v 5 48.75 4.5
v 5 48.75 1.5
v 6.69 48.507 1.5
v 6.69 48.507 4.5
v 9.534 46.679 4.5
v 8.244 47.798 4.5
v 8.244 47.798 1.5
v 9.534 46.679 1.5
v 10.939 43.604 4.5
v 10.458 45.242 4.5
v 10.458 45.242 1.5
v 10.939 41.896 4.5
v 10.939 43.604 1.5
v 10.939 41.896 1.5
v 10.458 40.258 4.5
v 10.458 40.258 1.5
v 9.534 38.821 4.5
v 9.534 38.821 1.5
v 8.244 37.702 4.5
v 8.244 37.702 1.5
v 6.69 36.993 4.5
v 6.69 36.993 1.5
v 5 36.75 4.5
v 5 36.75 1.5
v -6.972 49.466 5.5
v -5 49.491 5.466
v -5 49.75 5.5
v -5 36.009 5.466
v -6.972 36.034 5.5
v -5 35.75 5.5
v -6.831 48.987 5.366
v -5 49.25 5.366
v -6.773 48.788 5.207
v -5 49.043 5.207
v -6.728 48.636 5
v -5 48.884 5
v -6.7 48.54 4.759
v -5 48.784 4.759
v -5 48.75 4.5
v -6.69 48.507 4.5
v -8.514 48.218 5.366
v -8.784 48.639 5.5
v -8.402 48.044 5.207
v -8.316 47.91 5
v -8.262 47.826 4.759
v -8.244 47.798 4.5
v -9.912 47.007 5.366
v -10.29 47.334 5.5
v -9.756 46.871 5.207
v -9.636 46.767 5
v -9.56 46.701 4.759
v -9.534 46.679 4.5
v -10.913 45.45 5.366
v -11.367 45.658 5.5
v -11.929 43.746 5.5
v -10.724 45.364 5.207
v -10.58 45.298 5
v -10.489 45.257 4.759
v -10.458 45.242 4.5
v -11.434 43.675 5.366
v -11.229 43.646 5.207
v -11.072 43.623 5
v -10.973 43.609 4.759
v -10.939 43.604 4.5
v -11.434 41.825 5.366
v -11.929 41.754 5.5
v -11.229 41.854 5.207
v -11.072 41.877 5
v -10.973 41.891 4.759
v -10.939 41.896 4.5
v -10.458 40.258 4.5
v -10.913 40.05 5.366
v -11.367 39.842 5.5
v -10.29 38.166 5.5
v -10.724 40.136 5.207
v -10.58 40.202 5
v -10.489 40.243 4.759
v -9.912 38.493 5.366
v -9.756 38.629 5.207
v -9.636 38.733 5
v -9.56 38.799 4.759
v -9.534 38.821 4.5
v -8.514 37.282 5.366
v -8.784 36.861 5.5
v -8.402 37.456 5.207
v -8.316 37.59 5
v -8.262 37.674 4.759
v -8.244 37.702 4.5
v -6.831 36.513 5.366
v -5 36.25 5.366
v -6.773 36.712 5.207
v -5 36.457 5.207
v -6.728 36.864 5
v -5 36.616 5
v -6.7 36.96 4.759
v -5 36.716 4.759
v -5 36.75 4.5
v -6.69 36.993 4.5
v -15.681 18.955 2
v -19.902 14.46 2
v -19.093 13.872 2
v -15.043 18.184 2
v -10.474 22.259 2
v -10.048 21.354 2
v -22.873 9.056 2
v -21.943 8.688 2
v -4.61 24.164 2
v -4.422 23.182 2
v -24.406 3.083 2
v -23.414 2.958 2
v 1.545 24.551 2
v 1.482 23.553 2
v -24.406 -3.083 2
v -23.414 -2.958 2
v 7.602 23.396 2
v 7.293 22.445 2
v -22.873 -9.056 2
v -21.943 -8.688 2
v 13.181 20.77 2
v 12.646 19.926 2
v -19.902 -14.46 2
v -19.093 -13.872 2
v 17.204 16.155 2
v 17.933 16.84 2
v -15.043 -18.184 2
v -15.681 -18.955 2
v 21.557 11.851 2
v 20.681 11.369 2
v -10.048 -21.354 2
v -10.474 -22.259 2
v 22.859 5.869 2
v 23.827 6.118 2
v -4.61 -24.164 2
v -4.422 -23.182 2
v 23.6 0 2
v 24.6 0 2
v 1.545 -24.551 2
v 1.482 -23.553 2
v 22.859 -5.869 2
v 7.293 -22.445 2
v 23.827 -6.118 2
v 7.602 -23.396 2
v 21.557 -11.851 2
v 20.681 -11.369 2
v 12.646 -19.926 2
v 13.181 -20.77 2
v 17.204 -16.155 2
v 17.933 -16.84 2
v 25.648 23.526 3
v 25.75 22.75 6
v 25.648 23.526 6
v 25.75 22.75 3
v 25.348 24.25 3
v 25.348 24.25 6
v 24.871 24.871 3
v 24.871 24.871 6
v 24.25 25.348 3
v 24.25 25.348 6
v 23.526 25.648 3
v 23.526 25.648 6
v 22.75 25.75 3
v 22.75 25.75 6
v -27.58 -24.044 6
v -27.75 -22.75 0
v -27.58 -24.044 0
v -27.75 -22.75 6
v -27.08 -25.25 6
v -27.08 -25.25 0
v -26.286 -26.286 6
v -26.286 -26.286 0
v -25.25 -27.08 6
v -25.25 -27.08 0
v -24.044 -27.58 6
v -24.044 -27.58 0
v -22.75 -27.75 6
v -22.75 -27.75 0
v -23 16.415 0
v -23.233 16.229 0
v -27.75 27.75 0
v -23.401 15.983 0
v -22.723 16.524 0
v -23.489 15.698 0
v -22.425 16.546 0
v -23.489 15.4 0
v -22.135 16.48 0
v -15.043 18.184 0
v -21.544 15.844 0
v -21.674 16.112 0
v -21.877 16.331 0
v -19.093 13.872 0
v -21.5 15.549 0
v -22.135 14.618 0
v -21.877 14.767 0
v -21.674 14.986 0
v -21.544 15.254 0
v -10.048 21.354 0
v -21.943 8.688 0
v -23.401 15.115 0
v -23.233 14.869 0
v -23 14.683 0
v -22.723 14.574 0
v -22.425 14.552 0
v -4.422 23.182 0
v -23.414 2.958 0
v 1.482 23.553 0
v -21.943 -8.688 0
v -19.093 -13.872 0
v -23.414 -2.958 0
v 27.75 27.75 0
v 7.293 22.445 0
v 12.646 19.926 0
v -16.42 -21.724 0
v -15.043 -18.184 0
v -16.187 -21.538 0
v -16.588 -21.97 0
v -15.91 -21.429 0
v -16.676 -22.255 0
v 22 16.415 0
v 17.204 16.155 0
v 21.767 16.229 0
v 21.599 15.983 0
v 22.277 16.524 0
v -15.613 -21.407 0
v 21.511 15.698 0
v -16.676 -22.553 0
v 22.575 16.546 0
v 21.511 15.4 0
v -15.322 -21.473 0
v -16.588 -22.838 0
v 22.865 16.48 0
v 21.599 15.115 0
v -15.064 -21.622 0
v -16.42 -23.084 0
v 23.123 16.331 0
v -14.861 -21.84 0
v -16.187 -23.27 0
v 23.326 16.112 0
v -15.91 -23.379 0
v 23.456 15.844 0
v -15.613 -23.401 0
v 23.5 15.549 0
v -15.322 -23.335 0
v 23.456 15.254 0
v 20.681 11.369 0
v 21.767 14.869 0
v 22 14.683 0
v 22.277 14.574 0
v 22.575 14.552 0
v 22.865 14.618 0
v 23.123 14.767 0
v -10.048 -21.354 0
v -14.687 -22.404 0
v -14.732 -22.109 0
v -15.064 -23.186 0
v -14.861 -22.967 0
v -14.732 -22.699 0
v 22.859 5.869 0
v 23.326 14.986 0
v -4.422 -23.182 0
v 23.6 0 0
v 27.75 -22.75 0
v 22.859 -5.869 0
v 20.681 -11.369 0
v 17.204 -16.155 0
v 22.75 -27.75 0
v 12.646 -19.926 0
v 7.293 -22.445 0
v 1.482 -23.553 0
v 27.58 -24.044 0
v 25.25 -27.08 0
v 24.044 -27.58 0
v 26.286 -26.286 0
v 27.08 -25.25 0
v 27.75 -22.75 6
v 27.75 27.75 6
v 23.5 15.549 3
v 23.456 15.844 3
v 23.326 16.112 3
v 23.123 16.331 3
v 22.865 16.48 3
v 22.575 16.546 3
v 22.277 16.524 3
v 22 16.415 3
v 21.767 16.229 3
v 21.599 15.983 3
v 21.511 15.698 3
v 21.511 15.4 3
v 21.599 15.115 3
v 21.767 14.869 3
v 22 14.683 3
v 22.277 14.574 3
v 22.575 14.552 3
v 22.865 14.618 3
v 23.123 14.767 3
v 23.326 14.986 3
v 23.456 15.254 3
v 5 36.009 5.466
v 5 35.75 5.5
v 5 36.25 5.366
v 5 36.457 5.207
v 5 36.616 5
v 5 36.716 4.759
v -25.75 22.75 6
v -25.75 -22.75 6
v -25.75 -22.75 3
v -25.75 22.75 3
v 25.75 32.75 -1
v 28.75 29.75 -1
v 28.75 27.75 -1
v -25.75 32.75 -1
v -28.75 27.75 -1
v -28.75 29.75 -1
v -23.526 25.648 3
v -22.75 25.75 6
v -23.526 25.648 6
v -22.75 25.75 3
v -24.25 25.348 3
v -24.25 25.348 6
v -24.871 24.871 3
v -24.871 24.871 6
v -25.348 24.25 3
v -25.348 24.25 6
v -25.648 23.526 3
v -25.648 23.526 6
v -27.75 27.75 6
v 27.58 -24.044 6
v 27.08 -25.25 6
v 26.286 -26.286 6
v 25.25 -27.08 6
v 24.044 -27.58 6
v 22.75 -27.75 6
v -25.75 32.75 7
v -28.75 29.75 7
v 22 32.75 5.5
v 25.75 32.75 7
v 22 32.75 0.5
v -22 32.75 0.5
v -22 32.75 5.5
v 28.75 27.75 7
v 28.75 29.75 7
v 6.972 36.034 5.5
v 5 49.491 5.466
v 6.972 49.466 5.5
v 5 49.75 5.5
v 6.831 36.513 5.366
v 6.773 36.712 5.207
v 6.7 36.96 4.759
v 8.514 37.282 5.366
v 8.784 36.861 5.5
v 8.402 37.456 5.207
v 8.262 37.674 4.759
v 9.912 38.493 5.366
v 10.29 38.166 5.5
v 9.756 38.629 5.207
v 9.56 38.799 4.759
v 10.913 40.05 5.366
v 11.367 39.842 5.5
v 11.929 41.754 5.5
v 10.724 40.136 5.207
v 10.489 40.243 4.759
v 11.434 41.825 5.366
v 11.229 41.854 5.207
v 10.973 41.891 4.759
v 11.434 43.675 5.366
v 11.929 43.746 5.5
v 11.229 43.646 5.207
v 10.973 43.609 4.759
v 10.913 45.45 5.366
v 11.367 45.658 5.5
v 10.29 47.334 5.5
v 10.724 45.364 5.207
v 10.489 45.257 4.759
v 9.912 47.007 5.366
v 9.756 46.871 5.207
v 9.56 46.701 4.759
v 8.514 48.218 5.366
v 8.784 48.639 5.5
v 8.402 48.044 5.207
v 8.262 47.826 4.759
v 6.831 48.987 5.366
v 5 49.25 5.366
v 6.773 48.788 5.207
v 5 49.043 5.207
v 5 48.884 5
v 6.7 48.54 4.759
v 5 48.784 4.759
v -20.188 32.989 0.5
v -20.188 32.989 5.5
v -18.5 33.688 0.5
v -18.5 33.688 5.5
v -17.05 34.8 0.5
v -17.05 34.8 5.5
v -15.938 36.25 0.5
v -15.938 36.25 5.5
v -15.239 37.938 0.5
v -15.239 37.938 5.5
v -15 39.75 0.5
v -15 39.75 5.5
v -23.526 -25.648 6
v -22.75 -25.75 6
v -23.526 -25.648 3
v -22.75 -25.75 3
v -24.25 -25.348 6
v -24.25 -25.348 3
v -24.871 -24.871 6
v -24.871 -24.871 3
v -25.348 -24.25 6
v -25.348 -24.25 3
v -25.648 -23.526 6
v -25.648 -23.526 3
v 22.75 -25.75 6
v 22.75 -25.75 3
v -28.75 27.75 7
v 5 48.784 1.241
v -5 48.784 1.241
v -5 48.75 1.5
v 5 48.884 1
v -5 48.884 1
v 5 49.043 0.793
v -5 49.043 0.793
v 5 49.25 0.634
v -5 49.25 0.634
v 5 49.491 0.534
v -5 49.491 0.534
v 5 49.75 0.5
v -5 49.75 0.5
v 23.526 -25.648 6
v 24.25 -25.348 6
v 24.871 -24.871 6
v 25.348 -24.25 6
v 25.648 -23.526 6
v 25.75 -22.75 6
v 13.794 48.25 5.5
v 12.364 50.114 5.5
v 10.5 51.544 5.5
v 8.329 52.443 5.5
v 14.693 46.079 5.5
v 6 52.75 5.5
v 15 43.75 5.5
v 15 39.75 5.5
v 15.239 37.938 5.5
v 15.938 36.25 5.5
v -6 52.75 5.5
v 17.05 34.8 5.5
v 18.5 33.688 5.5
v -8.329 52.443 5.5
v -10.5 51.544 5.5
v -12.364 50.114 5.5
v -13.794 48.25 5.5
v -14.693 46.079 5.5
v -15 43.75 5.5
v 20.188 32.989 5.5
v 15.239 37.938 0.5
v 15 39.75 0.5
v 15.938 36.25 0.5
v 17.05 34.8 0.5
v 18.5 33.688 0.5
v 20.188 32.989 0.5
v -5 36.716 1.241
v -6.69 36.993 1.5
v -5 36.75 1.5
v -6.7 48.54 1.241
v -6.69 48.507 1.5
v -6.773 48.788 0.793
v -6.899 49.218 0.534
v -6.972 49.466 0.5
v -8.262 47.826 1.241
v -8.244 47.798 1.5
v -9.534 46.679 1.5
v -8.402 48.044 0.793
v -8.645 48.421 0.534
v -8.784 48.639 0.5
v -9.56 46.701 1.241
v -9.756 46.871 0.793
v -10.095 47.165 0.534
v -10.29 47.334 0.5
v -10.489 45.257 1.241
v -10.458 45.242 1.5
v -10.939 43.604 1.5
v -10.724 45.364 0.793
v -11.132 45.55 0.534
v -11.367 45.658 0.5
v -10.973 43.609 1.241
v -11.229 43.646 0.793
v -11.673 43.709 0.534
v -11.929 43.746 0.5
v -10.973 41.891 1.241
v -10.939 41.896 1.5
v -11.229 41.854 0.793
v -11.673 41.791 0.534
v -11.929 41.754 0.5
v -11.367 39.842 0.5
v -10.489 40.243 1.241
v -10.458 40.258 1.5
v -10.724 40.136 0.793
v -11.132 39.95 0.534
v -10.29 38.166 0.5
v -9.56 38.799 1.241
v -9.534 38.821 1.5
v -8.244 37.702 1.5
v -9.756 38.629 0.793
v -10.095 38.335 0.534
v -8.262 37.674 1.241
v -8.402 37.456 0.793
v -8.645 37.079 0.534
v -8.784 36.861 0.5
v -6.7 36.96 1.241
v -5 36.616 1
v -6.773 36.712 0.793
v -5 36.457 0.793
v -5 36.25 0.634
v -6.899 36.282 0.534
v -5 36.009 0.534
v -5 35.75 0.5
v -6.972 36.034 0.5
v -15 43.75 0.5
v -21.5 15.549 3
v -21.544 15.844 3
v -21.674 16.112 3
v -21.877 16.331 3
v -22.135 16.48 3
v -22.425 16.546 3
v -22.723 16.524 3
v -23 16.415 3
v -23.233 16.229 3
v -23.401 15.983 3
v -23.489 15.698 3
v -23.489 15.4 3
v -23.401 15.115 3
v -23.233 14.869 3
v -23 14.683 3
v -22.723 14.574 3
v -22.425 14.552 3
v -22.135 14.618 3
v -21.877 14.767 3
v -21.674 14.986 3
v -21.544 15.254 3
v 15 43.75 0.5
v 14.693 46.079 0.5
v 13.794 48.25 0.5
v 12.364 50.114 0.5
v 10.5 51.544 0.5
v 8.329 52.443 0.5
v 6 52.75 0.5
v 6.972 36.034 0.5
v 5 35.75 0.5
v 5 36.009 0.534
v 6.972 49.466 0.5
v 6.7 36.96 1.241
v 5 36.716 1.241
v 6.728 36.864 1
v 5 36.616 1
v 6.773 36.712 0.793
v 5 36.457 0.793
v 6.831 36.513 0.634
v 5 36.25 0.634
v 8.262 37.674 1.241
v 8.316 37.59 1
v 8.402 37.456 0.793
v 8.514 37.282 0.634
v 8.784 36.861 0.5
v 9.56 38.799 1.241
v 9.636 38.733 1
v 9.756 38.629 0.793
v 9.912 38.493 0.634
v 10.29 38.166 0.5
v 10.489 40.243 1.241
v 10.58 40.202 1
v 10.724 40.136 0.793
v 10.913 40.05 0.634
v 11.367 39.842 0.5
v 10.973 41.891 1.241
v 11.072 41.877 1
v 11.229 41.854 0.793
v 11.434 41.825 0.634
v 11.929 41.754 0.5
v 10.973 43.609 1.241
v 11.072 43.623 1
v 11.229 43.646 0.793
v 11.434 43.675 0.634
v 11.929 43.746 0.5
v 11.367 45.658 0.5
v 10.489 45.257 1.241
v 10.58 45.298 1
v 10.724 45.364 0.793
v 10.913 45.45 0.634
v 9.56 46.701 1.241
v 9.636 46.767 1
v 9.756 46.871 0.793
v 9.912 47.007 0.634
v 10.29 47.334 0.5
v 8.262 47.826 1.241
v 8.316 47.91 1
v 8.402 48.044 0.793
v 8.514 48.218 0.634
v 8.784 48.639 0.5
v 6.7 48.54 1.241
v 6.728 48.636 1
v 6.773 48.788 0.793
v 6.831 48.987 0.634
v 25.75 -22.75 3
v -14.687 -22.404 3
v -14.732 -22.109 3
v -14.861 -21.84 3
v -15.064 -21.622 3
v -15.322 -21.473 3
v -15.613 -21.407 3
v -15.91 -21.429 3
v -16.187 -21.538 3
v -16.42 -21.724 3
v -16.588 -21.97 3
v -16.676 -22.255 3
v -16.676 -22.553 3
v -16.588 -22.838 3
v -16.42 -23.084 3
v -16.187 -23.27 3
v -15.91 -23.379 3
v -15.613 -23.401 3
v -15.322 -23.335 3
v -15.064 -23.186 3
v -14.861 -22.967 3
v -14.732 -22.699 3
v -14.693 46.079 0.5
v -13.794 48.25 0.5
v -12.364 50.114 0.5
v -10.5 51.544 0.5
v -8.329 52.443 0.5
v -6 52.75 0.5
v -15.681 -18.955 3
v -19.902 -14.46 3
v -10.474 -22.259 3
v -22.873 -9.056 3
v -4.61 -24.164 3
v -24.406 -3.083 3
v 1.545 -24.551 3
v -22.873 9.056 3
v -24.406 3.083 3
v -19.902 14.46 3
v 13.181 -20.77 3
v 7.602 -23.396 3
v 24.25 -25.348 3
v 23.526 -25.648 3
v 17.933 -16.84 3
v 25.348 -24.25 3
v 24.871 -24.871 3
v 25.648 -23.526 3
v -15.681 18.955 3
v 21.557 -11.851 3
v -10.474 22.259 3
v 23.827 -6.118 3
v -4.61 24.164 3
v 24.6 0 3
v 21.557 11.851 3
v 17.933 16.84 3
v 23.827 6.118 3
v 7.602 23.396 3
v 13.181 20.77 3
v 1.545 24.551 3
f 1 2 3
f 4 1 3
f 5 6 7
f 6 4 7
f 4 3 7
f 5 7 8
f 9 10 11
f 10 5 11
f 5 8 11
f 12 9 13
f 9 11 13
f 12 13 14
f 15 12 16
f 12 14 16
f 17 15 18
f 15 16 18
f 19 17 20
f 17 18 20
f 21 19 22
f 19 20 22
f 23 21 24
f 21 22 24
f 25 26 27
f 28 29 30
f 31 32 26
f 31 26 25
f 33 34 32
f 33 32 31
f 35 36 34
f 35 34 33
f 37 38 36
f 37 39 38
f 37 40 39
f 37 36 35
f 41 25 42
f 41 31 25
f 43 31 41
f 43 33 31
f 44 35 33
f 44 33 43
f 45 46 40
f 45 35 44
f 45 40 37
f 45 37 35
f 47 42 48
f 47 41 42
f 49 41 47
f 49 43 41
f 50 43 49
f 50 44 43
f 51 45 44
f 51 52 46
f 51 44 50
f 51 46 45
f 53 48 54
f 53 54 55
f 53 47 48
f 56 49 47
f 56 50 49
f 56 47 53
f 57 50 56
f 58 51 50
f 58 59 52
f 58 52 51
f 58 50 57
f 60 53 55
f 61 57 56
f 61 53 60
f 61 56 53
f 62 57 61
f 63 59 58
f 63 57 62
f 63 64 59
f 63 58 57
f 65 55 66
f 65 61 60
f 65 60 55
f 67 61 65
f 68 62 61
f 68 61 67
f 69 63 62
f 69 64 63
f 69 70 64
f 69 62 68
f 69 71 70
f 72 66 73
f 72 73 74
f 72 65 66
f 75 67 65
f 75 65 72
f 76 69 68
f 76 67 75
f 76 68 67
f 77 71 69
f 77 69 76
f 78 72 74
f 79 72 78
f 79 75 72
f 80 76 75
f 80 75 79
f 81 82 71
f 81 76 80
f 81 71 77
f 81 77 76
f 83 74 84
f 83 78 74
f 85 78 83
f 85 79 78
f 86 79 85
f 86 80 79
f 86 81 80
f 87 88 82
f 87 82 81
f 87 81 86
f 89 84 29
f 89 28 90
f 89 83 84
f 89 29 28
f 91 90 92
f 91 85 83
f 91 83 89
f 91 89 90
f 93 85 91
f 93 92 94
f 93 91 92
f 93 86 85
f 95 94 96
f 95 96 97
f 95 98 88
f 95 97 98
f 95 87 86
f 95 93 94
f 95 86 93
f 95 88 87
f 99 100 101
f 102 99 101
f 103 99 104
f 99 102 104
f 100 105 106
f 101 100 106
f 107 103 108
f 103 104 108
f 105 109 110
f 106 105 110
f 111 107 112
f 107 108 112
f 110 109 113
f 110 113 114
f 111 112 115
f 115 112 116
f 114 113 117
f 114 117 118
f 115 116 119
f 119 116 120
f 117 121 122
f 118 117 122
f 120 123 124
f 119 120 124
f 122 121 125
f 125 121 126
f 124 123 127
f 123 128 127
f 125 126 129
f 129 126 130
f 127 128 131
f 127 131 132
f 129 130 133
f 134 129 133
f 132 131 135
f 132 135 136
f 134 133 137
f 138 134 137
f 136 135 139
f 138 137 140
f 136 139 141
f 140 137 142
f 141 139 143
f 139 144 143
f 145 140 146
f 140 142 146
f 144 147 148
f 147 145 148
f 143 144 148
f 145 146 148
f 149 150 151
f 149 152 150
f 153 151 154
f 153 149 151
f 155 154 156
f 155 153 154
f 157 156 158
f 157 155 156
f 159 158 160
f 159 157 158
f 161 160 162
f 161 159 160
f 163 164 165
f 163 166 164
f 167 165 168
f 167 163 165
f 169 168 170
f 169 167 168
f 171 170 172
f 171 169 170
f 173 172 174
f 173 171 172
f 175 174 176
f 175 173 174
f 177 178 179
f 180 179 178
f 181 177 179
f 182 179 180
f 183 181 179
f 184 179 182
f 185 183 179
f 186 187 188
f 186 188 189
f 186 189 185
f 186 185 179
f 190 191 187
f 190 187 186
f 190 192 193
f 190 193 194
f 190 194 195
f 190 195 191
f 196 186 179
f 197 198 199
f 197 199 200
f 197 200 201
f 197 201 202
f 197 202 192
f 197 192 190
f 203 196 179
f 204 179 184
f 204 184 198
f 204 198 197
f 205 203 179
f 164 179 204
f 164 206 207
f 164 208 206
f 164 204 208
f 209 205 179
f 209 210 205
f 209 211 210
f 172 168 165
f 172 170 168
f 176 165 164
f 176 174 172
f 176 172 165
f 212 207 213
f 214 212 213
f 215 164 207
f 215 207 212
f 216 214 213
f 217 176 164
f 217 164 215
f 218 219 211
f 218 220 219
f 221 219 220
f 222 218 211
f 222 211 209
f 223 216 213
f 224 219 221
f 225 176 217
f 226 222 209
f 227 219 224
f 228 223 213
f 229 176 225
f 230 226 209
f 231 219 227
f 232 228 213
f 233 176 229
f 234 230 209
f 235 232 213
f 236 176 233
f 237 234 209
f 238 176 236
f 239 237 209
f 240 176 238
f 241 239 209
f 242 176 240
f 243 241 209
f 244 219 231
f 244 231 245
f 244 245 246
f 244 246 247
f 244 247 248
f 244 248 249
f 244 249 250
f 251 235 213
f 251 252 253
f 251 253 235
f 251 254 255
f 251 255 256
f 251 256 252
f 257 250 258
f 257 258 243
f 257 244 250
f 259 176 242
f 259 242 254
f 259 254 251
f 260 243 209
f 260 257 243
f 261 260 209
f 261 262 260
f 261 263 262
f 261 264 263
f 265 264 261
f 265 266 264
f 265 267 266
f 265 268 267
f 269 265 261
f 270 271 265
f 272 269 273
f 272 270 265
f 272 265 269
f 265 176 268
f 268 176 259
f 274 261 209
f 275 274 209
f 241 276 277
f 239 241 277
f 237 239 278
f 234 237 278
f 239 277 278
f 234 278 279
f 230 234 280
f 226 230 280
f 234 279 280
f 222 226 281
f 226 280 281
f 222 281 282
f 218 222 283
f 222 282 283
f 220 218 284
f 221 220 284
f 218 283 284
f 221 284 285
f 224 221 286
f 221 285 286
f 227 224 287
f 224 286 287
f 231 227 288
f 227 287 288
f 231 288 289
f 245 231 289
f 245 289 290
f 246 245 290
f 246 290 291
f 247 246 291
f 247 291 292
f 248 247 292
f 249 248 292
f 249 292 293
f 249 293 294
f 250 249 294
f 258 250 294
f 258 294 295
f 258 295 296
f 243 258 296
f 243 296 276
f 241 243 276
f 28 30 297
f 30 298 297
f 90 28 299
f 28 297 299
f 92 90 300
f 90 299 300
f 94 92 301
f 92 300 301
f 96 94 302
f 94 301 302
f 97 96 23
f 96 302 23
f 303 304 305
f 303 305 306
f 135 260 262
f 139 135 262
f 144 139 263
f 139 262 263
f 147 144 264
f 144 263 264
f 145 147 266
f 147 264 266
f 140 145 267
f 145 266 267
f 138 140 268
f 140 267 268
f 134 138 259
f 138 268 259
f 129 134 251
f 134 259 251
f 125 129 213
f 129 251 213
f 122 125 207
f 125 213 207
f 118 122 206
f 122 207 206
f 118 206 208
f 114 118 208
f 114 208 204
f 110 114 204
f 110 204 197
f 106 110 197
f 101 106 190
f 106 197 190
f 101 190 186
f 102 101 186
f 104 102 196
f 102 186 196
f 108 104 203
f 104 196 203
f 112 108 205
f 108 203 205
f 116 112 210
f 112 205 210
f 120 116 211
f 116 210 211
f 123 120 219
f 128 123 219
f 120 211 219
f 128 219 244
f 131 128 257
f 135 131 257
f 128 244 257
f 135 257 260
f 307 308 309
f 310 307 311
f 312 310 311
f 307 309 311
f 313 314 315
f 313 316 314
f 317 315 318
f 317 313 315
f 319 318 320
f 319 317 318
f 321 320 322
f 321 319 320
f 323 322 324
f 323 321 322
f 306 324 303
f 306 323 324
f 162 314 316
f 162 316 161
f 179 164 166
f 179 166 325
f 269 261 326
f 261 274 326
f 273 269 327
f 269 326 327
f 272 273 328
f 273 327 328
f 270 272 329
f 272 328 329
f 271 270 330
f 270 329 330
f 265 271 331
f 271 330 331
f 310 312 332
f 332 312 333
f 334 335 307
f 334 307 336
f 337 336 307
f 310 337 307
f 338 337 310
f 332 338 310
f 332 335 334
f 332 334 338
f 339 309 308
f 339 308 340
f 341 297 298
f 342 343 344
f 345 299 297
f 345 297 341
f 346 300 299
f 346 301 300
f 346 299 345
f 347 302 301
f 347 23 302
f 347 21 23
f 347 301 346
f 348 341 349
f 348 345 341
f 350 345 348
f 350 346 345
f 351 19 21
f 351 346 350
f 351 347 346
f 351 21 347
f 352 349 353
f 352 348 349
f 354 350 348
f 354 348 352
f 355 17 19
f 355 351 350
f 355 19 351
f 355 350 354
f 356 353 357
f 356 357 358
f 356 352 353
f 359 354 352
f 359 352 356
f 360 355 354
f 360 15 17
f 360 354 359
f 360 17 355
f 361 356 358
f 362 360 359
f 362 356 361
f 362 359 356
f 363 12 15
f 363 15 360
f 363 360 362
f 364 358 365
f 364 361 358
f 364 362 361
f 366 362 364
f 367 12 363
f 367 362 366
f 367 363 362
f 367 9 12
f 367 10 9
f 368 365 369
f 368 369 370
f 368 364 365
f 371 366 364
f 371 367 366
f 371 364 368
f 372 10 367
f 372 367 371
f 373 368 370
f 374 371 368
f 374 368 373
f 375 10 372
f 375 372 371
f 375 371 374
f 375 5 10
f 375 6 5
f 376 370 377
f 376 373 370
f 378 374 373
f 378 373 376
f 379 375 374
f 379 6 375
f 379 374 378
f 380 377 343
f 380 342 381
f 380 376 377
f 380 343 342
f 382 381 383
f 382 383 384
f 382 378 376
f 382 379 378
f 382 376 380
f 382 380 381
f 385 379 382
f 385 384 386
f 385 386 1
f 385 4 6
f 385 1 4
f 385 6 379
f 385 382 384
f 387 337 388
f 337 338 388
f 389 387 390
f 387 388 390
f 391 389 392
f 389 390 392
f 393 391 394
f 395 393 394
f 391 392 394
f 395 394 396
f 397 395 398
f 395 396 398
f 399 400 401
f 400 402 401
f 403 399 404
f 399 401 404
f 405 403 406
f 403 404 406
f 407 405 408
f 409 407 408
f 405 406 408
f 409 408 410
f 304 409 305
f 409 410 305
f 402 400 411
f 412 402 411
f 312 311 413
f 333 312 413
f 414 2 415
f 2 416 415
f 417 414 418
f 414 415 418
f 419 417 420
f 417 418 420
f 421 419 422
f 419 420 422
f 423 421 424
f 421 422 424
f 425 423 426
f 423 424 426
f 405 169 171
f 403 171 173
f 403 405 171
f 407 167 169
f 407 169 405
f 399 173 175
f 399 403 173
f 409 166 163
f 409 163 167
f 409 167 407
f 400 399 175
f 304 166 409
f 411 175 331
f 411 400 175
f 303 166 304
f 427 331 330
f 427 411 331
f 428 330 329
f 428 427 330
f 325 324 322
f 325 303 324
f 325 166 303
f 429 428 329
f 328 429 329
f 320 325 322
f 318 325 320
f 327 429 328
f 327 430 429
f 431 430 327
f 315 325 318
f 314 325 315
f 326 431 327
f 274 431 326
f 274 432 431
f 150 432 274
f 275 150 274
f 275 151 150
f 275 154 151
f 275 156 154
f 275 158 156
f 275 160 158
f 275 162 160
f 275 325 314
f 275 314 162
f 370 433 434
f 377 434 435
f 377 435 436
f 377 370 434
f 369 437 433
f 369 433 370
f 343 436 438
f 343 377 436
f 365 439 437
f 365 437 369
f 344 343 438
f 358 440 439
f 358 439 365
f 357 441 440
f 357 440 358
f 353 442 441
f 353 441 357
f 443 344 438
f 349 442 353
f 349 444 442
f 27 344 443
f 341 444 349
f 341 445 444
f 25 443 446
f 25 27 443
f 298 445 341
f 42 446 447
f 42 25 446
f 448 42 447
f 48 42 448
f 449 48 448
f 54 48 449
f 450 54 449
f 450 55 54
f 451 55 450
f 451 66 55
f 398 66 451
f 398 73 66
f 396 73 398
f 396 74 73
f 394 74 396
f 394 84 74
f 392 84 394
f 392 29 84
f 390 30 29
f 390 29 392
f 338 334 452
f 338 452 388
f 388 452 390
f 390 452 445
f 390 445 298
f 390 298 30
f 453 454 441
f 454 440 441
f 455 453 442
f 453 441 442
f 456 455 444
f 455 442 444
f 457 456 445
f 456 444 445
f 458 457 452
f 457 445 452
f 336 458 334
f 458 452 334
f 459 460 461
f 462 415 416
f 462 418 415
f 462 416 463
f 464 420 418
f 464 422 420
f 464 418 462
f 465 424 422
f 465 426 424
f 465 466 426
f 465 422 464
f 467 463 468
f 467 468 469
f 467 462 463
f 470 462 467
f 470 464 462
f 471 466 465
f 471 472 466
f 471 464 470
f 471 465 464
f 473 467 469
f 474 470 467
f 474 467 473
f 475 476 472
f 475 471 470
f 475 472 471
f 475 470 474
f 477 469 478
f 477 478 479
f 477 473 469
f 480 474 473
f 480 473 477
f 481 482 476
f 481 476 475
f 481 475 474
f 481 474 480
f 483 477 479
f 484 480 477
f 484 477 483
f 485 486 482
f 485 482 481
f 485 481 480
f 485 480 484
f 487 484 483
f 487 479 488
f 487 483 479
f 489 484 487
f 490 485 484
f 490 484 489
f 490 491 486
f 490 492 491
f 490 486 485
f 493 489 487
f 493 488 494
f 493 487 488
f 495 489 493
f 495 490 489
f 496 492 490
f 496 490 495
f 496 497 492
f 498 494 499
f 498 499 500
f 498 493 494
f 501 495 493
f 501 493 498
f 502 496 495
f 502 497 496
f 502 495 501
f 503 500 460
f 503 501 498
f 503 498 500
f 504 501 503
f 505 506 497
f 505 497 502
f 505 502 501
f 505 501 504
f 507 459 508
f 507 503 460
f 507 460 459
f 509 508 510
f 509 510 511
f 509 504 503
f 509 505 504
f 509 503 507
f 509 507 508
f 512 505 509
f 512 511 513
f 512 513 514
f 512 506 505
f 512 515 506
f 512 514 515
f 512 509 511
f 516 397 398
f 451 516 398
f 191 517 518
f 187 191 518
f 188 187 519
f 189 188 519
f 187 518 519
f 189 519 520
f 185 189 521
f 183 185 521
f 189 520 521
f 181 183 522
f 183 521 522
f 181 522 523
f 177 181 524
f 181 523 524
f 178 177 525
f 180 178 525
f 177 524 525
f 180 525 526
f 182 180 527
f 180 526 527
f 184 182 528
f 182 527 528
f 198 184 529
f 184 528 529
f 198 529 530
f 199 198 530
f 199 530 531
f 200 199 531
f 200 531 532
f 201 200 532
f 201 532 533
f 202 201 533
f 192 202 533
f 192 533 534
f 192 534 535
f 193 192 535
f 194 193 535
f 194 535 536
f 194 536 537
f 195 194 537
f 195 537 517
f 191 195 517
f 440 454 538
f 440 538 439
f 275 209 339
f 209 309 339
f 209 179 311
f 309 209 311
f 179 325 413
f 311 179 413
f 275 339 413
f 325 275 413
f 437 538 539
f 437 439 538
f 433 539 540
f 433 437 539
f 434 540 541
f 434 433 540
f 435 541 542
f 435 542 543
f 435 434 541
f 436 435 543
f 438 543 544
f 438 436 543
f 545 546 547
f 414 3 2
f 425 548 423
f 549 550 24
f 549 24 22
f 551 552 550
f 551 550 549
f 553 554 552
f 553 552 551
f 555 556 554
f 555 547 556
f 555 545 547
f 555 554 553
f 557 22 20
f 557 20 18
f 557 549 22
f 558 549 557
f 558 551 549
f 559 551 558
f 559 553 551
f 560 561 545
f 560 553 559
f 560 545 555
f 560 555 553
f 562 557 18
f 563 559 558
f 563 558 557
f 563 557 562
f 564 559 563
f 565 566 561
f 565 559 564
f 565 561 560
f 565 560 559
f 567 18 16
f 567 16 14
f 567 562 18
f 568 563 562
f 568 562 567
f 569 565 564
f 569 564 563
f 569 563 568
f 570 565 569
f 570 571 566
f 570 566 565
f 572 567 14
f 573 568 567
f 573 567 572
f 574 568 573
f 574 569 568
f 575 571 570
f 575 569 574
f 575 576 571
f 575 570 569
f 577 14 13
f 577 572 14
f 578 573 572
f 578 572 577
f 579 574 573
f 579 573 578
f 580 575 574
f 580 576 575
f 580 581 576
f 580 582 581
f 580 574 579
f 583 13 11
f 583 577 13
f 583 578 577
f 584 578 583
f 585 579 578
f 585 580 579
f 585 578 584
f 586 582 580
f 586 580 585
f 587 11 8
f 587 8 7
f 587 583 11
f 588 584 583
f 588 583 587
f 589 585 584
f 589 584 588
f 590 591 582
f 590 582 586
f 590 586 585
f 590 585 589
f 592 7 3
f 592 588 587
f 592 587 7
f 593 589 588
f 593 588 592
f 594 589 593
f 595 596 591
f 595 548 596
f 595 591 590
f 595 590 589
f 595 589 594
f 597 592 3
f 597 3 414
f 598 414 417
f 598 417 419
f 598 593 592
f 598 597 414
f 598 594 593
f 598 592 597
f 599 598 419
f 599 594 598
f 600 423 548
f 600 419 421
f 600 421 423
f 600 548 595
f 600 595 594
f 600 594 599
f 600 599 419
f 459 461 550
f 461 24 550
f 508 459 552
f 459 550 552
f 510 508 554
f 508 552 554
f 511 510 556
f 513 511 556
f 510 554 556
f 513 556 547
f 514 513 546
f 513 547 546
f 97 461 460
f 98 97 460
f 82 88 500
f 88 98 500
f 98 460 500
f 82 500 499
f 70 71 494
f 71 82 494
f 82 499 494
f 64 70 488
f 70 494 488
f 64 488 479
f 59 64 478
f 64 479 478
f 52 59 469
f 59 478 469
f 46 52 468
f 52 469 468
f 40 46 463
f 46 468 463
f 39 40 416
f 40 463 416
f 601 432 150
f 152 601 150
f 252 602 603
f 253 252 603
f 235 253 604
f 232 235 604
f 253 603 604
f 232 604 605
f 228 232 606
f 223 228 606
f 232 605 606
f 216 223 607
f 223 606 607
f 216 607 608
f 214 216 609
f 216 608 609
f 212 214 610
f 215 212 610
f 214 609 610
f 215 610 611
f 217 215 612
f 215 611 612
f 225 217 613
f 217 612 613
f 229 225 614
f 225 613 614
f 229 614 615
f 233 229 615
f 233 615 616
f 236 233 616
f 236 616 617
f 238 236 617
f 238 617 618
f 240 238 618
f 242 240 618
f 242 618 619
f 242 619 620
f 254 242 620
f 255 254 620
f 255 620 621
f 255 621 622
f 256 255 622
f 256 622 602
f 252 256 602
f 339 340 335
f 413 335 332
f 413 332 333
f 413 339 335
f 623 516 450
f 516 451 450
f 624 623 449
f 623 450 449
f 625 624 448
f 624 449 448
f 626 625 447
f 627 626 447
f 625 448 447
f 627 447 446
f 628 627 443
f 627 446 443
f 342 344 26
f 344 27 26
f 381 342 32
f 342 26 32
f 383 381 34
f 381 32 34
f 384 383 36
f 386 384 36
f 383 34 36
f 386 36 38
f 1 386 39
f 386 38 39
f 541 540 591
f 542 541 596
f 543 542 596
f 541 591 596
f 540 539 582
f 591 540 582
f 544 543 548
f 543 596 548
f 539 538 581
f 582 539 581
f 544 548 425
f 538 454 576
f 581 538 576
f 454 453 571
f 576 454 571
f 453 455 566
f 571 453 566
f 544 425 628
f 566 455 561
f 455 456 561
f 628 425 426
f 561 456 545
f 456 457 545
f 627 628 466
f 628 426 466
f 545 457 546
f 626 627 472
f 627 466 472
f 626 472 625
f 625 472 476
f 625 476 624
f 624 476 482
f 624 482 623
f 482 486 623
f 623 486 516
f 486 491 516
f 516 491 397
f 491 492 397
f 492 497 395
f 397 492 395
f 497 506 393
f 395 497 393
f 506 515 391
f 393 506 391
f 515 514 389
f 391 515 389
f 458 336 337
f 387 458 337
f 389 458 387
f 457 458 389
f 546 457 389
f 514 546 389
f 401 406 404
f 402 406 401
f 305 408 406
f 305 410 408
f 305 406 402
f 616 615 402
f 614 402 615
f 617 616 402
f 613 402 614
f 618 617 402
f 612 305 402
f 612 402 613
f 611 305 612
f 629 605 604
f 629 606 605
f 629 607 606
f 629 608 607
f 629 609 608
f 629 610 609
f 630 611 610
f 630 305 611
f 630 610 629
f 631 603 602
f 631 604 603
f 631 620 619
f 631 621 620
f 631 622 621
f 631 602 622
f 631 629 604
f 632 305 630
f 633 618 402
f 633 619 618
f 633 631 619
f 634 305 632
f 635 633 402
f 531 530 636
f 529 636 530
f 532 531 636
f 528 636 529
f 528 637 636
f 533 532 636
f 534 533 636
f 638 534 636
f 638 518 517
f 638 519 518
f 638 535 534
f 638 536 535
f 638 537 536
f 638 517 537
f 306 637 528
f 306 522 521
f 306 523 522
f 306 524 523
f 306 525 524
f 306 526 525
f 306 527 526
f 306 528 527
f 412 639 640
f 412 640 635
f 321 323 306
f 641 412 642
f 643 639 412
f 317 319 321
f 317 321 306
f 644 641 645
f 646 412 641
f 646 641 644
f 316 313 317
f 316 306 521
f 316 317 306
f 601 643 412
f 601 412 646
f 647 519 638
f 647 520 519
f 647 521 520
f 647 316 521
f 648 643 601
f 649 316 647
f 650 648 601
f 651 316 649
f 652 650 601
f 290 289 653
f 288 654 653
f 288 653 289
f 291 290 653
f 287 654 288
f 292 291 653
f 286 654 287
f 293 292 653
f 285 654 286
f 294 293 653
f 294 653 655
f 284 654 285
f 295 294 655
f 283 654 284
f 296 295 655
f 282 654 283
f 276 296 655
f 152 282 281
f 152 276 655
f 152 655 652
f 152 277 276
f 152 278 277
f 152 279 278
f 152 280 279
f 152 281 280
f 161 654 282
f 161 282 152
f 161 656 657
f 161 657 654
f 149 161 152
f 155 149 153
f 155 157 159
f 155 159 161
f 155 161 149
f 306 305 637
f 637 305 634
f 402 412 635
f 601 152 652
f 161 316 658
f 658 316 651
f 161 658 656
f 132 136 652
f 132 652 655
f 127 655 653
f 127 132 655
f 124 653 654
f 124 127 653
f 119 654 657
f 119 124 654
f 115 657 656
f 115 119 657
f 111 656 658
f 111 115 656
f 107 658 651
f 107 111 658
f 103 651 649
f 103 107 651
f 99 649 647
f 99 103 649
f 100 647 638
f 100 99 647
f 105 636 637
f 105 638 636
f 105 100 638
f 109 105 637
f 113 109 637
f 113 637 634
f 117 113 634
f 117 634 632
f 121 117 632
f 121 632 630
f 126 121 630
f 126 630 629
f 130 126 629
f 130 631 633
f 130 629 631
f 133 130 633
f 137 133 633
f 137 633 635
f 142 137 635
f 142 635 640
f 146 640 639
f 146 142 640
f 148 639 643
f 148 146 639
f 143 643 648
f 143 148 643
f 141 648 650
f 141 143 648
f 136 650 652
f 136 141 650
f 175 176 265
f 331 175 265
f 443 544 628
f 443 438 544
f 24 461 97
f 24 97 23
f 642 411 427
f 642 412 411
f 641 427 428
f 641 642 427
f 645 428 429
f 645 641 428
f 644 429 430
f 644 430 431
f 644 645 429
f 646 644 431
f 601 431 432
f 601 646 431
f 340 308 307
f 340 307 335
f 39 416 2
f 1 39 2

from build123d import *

# Parameters (mm, degrees)
SKETCH_W        = 55.5
SKETCH_H        = 55.5
SKETCH_R        = 24.6
PAD_DEPTH       = 6
SKETCH001_W     = 57.5
SKETCH001_H     = 8
PAD001_DEPTH    = 5
SKETCH002_W     = 30
SKETCH002_H     = 5
PAD002_DEPTH    = 20
FILLET_R        = 5
POCKET_DEPTH    = 6
FILLET001_R     = 9
FILLET002_R     = 7
CHAMFER_SIZE    = 3
SKETCH004_R     = 24.6
SKETCH004_R_2   = 23.6
PAD003_DEPTH    = 2
SKETCH005_W     = 51.5
SKETCH005_H     = 51.5
POCKET001_DEPTH = 3
SKETCH006_R     = 1
POCKET002_DEPTH = 6
FILLET003_R     = 1
FILLET004_R     = 1
FILLET005_R     = 3


with BuildPart() as part:
    # Sketch → Pad (new body)
    with BuildSketch(Plane.XY):
        Rectangle(SKETCH_W, SKETCH_H)
        Circle(SKETCH_R, mode=Mode.SUBTRACT)
    extrude(amount=PAD_DEPTH)

    # Sketch001 → Pad001 (new body)
    with BuildSketch(Plane(origin=(0, 27.75, 0), x_dir=(-1, 0, 0), z_dir=(0, 1, 0))):
        with Locations((0, 3)):
            Rectangle(SKETCH001_W, SKETCH001_H)
    extrude(amount=PAD001_DEPTH)

    # Sketch002 → Pad002 (new body)
    with BuildSketch(Plane(origin=(0, 32.75, 0), x_dir=(-1, 0, 0), z_dir=(0, 1, 0))):
        with Locations((0, 3)):
            Rectangle(SKETCH002_W, SKETCH002_H)
    extrude(amount=PAD002_DEPTH)

    # Fillet
    fillet_edges = [part.edges().sort_by_distance(p)[0] for p in [
        (-27.75, -27.75, 3),
        (27.75, -27.75, 3),
    ]]
    fillet(fillet_edges, radius=FILLET_R)

    # Sketch003 → Pocket (cut)
    with BuildSketch(Plane(origin=(0, 0, 0.5), x_dir=(1, 0, 0), z_dir=(0, 0, -1))):
        with BuildLine():
            ThreePointArc((-5, -36.75), (-11, -42.75), (-5, -48.75))
            Line((-5, -48.75), (5, -48.75))
            ThreePointArc((5, -48.75), (11, -42.75), (5, -36.75))
            Line((-5, -36.75), (5, -36.75))
        make_face()
    extrude(amount=-POCKET_DEPTH, mode=Mode.SUBTRACT)

    # Fillet001
    fillet001_edges = [part.edges().sort_by_distance(p)[0] for p in [
        (15, 52.75, 3),
        (-15, 52.75, 3),
    ]]
    fillet(fillet001_edges, radius=FILLET001_R)

    # Fillet002
    fillet002_edges = [part.edges().sort_by_distance(p)[0] for p in [
        (15, 32.75, 3),
        (-15, 32.75, 3),
    ]]
    fillet(fillet002_edges, radius=FILLET002_R)

    # Chamfer
    chamfer_edges = [part.edges().sort_by_distance(p)[0] for p in [
        (-28.75, 32.75, 3),
        (28.75, 32.75, 3),
    ]]
    chamfer(chamfer_edges, length=CHAMFER_SIZE)

    # Sketch004 → Pad003 (new body)
    with BuildSketch(Plane(origin=(0, 0, 0), x_dir=(1, 0, 0), z_dir=(0, 0, -1))):
        Circle(SKETCH004_R)
        Circle(SKETCH004_R_2, mode=Mode.SUBTRACT)
    extrude(amount=-PAD003_DEPTH)

    # Sketch005 → Pocket001 (cut)
    with BuildSketch(Plane.XY.offset(6)):
        Rectangle(SKETCH005_W, SKETCH005_H)
    extrude(amount=-POCKET001_DEPTH, mode=Mode.SUBTRACT)

    # Sketch006 → Pocket002 (cut)
    with BuildSketch(Plane.XY.offset(3)):
        with Locations((-22.5, 15.549035)):
            Circle(SKETCH006_R)
        with Locations((22.5, 15.549035)):
            Circle(SKETCH006_R)
        with Locations((-15.687316, -22.403808)):
            Circle(SKETCH006_R)
    extrude(amount=-POCKET002_DEPTH, mode=Mode.SUBTRACT)

    # Fillet003
    fillet003_edges = [part.edges().sort_by_distance(p)[0] for p in [
        (0, 48.75, 5.5),
    ]]
    fillet(fillet003_edges, radius=FILLET003_R)

    # Fillet004
    fillet004_edges = [part.edges().sort_by_distance(p)[0] for p in [
        (0, 36.75, 0.5),
    ]]
    fillet(fillet004_edges, radius=FILLET004_R)

    # Fillet005
    fillet005_edges = [part.edges().sort_by_distance(p)[0] for p in [
        (-25.75, -25.75, 4.5),
        (25.75, -25.75, 4.5),
        (25.75, 25.75, 4.5),
        (-25.75, 25.75, 4.5),
    ]]
    fillet(fillet005_edges, radius=FILLET005_R)


solid = part.part
